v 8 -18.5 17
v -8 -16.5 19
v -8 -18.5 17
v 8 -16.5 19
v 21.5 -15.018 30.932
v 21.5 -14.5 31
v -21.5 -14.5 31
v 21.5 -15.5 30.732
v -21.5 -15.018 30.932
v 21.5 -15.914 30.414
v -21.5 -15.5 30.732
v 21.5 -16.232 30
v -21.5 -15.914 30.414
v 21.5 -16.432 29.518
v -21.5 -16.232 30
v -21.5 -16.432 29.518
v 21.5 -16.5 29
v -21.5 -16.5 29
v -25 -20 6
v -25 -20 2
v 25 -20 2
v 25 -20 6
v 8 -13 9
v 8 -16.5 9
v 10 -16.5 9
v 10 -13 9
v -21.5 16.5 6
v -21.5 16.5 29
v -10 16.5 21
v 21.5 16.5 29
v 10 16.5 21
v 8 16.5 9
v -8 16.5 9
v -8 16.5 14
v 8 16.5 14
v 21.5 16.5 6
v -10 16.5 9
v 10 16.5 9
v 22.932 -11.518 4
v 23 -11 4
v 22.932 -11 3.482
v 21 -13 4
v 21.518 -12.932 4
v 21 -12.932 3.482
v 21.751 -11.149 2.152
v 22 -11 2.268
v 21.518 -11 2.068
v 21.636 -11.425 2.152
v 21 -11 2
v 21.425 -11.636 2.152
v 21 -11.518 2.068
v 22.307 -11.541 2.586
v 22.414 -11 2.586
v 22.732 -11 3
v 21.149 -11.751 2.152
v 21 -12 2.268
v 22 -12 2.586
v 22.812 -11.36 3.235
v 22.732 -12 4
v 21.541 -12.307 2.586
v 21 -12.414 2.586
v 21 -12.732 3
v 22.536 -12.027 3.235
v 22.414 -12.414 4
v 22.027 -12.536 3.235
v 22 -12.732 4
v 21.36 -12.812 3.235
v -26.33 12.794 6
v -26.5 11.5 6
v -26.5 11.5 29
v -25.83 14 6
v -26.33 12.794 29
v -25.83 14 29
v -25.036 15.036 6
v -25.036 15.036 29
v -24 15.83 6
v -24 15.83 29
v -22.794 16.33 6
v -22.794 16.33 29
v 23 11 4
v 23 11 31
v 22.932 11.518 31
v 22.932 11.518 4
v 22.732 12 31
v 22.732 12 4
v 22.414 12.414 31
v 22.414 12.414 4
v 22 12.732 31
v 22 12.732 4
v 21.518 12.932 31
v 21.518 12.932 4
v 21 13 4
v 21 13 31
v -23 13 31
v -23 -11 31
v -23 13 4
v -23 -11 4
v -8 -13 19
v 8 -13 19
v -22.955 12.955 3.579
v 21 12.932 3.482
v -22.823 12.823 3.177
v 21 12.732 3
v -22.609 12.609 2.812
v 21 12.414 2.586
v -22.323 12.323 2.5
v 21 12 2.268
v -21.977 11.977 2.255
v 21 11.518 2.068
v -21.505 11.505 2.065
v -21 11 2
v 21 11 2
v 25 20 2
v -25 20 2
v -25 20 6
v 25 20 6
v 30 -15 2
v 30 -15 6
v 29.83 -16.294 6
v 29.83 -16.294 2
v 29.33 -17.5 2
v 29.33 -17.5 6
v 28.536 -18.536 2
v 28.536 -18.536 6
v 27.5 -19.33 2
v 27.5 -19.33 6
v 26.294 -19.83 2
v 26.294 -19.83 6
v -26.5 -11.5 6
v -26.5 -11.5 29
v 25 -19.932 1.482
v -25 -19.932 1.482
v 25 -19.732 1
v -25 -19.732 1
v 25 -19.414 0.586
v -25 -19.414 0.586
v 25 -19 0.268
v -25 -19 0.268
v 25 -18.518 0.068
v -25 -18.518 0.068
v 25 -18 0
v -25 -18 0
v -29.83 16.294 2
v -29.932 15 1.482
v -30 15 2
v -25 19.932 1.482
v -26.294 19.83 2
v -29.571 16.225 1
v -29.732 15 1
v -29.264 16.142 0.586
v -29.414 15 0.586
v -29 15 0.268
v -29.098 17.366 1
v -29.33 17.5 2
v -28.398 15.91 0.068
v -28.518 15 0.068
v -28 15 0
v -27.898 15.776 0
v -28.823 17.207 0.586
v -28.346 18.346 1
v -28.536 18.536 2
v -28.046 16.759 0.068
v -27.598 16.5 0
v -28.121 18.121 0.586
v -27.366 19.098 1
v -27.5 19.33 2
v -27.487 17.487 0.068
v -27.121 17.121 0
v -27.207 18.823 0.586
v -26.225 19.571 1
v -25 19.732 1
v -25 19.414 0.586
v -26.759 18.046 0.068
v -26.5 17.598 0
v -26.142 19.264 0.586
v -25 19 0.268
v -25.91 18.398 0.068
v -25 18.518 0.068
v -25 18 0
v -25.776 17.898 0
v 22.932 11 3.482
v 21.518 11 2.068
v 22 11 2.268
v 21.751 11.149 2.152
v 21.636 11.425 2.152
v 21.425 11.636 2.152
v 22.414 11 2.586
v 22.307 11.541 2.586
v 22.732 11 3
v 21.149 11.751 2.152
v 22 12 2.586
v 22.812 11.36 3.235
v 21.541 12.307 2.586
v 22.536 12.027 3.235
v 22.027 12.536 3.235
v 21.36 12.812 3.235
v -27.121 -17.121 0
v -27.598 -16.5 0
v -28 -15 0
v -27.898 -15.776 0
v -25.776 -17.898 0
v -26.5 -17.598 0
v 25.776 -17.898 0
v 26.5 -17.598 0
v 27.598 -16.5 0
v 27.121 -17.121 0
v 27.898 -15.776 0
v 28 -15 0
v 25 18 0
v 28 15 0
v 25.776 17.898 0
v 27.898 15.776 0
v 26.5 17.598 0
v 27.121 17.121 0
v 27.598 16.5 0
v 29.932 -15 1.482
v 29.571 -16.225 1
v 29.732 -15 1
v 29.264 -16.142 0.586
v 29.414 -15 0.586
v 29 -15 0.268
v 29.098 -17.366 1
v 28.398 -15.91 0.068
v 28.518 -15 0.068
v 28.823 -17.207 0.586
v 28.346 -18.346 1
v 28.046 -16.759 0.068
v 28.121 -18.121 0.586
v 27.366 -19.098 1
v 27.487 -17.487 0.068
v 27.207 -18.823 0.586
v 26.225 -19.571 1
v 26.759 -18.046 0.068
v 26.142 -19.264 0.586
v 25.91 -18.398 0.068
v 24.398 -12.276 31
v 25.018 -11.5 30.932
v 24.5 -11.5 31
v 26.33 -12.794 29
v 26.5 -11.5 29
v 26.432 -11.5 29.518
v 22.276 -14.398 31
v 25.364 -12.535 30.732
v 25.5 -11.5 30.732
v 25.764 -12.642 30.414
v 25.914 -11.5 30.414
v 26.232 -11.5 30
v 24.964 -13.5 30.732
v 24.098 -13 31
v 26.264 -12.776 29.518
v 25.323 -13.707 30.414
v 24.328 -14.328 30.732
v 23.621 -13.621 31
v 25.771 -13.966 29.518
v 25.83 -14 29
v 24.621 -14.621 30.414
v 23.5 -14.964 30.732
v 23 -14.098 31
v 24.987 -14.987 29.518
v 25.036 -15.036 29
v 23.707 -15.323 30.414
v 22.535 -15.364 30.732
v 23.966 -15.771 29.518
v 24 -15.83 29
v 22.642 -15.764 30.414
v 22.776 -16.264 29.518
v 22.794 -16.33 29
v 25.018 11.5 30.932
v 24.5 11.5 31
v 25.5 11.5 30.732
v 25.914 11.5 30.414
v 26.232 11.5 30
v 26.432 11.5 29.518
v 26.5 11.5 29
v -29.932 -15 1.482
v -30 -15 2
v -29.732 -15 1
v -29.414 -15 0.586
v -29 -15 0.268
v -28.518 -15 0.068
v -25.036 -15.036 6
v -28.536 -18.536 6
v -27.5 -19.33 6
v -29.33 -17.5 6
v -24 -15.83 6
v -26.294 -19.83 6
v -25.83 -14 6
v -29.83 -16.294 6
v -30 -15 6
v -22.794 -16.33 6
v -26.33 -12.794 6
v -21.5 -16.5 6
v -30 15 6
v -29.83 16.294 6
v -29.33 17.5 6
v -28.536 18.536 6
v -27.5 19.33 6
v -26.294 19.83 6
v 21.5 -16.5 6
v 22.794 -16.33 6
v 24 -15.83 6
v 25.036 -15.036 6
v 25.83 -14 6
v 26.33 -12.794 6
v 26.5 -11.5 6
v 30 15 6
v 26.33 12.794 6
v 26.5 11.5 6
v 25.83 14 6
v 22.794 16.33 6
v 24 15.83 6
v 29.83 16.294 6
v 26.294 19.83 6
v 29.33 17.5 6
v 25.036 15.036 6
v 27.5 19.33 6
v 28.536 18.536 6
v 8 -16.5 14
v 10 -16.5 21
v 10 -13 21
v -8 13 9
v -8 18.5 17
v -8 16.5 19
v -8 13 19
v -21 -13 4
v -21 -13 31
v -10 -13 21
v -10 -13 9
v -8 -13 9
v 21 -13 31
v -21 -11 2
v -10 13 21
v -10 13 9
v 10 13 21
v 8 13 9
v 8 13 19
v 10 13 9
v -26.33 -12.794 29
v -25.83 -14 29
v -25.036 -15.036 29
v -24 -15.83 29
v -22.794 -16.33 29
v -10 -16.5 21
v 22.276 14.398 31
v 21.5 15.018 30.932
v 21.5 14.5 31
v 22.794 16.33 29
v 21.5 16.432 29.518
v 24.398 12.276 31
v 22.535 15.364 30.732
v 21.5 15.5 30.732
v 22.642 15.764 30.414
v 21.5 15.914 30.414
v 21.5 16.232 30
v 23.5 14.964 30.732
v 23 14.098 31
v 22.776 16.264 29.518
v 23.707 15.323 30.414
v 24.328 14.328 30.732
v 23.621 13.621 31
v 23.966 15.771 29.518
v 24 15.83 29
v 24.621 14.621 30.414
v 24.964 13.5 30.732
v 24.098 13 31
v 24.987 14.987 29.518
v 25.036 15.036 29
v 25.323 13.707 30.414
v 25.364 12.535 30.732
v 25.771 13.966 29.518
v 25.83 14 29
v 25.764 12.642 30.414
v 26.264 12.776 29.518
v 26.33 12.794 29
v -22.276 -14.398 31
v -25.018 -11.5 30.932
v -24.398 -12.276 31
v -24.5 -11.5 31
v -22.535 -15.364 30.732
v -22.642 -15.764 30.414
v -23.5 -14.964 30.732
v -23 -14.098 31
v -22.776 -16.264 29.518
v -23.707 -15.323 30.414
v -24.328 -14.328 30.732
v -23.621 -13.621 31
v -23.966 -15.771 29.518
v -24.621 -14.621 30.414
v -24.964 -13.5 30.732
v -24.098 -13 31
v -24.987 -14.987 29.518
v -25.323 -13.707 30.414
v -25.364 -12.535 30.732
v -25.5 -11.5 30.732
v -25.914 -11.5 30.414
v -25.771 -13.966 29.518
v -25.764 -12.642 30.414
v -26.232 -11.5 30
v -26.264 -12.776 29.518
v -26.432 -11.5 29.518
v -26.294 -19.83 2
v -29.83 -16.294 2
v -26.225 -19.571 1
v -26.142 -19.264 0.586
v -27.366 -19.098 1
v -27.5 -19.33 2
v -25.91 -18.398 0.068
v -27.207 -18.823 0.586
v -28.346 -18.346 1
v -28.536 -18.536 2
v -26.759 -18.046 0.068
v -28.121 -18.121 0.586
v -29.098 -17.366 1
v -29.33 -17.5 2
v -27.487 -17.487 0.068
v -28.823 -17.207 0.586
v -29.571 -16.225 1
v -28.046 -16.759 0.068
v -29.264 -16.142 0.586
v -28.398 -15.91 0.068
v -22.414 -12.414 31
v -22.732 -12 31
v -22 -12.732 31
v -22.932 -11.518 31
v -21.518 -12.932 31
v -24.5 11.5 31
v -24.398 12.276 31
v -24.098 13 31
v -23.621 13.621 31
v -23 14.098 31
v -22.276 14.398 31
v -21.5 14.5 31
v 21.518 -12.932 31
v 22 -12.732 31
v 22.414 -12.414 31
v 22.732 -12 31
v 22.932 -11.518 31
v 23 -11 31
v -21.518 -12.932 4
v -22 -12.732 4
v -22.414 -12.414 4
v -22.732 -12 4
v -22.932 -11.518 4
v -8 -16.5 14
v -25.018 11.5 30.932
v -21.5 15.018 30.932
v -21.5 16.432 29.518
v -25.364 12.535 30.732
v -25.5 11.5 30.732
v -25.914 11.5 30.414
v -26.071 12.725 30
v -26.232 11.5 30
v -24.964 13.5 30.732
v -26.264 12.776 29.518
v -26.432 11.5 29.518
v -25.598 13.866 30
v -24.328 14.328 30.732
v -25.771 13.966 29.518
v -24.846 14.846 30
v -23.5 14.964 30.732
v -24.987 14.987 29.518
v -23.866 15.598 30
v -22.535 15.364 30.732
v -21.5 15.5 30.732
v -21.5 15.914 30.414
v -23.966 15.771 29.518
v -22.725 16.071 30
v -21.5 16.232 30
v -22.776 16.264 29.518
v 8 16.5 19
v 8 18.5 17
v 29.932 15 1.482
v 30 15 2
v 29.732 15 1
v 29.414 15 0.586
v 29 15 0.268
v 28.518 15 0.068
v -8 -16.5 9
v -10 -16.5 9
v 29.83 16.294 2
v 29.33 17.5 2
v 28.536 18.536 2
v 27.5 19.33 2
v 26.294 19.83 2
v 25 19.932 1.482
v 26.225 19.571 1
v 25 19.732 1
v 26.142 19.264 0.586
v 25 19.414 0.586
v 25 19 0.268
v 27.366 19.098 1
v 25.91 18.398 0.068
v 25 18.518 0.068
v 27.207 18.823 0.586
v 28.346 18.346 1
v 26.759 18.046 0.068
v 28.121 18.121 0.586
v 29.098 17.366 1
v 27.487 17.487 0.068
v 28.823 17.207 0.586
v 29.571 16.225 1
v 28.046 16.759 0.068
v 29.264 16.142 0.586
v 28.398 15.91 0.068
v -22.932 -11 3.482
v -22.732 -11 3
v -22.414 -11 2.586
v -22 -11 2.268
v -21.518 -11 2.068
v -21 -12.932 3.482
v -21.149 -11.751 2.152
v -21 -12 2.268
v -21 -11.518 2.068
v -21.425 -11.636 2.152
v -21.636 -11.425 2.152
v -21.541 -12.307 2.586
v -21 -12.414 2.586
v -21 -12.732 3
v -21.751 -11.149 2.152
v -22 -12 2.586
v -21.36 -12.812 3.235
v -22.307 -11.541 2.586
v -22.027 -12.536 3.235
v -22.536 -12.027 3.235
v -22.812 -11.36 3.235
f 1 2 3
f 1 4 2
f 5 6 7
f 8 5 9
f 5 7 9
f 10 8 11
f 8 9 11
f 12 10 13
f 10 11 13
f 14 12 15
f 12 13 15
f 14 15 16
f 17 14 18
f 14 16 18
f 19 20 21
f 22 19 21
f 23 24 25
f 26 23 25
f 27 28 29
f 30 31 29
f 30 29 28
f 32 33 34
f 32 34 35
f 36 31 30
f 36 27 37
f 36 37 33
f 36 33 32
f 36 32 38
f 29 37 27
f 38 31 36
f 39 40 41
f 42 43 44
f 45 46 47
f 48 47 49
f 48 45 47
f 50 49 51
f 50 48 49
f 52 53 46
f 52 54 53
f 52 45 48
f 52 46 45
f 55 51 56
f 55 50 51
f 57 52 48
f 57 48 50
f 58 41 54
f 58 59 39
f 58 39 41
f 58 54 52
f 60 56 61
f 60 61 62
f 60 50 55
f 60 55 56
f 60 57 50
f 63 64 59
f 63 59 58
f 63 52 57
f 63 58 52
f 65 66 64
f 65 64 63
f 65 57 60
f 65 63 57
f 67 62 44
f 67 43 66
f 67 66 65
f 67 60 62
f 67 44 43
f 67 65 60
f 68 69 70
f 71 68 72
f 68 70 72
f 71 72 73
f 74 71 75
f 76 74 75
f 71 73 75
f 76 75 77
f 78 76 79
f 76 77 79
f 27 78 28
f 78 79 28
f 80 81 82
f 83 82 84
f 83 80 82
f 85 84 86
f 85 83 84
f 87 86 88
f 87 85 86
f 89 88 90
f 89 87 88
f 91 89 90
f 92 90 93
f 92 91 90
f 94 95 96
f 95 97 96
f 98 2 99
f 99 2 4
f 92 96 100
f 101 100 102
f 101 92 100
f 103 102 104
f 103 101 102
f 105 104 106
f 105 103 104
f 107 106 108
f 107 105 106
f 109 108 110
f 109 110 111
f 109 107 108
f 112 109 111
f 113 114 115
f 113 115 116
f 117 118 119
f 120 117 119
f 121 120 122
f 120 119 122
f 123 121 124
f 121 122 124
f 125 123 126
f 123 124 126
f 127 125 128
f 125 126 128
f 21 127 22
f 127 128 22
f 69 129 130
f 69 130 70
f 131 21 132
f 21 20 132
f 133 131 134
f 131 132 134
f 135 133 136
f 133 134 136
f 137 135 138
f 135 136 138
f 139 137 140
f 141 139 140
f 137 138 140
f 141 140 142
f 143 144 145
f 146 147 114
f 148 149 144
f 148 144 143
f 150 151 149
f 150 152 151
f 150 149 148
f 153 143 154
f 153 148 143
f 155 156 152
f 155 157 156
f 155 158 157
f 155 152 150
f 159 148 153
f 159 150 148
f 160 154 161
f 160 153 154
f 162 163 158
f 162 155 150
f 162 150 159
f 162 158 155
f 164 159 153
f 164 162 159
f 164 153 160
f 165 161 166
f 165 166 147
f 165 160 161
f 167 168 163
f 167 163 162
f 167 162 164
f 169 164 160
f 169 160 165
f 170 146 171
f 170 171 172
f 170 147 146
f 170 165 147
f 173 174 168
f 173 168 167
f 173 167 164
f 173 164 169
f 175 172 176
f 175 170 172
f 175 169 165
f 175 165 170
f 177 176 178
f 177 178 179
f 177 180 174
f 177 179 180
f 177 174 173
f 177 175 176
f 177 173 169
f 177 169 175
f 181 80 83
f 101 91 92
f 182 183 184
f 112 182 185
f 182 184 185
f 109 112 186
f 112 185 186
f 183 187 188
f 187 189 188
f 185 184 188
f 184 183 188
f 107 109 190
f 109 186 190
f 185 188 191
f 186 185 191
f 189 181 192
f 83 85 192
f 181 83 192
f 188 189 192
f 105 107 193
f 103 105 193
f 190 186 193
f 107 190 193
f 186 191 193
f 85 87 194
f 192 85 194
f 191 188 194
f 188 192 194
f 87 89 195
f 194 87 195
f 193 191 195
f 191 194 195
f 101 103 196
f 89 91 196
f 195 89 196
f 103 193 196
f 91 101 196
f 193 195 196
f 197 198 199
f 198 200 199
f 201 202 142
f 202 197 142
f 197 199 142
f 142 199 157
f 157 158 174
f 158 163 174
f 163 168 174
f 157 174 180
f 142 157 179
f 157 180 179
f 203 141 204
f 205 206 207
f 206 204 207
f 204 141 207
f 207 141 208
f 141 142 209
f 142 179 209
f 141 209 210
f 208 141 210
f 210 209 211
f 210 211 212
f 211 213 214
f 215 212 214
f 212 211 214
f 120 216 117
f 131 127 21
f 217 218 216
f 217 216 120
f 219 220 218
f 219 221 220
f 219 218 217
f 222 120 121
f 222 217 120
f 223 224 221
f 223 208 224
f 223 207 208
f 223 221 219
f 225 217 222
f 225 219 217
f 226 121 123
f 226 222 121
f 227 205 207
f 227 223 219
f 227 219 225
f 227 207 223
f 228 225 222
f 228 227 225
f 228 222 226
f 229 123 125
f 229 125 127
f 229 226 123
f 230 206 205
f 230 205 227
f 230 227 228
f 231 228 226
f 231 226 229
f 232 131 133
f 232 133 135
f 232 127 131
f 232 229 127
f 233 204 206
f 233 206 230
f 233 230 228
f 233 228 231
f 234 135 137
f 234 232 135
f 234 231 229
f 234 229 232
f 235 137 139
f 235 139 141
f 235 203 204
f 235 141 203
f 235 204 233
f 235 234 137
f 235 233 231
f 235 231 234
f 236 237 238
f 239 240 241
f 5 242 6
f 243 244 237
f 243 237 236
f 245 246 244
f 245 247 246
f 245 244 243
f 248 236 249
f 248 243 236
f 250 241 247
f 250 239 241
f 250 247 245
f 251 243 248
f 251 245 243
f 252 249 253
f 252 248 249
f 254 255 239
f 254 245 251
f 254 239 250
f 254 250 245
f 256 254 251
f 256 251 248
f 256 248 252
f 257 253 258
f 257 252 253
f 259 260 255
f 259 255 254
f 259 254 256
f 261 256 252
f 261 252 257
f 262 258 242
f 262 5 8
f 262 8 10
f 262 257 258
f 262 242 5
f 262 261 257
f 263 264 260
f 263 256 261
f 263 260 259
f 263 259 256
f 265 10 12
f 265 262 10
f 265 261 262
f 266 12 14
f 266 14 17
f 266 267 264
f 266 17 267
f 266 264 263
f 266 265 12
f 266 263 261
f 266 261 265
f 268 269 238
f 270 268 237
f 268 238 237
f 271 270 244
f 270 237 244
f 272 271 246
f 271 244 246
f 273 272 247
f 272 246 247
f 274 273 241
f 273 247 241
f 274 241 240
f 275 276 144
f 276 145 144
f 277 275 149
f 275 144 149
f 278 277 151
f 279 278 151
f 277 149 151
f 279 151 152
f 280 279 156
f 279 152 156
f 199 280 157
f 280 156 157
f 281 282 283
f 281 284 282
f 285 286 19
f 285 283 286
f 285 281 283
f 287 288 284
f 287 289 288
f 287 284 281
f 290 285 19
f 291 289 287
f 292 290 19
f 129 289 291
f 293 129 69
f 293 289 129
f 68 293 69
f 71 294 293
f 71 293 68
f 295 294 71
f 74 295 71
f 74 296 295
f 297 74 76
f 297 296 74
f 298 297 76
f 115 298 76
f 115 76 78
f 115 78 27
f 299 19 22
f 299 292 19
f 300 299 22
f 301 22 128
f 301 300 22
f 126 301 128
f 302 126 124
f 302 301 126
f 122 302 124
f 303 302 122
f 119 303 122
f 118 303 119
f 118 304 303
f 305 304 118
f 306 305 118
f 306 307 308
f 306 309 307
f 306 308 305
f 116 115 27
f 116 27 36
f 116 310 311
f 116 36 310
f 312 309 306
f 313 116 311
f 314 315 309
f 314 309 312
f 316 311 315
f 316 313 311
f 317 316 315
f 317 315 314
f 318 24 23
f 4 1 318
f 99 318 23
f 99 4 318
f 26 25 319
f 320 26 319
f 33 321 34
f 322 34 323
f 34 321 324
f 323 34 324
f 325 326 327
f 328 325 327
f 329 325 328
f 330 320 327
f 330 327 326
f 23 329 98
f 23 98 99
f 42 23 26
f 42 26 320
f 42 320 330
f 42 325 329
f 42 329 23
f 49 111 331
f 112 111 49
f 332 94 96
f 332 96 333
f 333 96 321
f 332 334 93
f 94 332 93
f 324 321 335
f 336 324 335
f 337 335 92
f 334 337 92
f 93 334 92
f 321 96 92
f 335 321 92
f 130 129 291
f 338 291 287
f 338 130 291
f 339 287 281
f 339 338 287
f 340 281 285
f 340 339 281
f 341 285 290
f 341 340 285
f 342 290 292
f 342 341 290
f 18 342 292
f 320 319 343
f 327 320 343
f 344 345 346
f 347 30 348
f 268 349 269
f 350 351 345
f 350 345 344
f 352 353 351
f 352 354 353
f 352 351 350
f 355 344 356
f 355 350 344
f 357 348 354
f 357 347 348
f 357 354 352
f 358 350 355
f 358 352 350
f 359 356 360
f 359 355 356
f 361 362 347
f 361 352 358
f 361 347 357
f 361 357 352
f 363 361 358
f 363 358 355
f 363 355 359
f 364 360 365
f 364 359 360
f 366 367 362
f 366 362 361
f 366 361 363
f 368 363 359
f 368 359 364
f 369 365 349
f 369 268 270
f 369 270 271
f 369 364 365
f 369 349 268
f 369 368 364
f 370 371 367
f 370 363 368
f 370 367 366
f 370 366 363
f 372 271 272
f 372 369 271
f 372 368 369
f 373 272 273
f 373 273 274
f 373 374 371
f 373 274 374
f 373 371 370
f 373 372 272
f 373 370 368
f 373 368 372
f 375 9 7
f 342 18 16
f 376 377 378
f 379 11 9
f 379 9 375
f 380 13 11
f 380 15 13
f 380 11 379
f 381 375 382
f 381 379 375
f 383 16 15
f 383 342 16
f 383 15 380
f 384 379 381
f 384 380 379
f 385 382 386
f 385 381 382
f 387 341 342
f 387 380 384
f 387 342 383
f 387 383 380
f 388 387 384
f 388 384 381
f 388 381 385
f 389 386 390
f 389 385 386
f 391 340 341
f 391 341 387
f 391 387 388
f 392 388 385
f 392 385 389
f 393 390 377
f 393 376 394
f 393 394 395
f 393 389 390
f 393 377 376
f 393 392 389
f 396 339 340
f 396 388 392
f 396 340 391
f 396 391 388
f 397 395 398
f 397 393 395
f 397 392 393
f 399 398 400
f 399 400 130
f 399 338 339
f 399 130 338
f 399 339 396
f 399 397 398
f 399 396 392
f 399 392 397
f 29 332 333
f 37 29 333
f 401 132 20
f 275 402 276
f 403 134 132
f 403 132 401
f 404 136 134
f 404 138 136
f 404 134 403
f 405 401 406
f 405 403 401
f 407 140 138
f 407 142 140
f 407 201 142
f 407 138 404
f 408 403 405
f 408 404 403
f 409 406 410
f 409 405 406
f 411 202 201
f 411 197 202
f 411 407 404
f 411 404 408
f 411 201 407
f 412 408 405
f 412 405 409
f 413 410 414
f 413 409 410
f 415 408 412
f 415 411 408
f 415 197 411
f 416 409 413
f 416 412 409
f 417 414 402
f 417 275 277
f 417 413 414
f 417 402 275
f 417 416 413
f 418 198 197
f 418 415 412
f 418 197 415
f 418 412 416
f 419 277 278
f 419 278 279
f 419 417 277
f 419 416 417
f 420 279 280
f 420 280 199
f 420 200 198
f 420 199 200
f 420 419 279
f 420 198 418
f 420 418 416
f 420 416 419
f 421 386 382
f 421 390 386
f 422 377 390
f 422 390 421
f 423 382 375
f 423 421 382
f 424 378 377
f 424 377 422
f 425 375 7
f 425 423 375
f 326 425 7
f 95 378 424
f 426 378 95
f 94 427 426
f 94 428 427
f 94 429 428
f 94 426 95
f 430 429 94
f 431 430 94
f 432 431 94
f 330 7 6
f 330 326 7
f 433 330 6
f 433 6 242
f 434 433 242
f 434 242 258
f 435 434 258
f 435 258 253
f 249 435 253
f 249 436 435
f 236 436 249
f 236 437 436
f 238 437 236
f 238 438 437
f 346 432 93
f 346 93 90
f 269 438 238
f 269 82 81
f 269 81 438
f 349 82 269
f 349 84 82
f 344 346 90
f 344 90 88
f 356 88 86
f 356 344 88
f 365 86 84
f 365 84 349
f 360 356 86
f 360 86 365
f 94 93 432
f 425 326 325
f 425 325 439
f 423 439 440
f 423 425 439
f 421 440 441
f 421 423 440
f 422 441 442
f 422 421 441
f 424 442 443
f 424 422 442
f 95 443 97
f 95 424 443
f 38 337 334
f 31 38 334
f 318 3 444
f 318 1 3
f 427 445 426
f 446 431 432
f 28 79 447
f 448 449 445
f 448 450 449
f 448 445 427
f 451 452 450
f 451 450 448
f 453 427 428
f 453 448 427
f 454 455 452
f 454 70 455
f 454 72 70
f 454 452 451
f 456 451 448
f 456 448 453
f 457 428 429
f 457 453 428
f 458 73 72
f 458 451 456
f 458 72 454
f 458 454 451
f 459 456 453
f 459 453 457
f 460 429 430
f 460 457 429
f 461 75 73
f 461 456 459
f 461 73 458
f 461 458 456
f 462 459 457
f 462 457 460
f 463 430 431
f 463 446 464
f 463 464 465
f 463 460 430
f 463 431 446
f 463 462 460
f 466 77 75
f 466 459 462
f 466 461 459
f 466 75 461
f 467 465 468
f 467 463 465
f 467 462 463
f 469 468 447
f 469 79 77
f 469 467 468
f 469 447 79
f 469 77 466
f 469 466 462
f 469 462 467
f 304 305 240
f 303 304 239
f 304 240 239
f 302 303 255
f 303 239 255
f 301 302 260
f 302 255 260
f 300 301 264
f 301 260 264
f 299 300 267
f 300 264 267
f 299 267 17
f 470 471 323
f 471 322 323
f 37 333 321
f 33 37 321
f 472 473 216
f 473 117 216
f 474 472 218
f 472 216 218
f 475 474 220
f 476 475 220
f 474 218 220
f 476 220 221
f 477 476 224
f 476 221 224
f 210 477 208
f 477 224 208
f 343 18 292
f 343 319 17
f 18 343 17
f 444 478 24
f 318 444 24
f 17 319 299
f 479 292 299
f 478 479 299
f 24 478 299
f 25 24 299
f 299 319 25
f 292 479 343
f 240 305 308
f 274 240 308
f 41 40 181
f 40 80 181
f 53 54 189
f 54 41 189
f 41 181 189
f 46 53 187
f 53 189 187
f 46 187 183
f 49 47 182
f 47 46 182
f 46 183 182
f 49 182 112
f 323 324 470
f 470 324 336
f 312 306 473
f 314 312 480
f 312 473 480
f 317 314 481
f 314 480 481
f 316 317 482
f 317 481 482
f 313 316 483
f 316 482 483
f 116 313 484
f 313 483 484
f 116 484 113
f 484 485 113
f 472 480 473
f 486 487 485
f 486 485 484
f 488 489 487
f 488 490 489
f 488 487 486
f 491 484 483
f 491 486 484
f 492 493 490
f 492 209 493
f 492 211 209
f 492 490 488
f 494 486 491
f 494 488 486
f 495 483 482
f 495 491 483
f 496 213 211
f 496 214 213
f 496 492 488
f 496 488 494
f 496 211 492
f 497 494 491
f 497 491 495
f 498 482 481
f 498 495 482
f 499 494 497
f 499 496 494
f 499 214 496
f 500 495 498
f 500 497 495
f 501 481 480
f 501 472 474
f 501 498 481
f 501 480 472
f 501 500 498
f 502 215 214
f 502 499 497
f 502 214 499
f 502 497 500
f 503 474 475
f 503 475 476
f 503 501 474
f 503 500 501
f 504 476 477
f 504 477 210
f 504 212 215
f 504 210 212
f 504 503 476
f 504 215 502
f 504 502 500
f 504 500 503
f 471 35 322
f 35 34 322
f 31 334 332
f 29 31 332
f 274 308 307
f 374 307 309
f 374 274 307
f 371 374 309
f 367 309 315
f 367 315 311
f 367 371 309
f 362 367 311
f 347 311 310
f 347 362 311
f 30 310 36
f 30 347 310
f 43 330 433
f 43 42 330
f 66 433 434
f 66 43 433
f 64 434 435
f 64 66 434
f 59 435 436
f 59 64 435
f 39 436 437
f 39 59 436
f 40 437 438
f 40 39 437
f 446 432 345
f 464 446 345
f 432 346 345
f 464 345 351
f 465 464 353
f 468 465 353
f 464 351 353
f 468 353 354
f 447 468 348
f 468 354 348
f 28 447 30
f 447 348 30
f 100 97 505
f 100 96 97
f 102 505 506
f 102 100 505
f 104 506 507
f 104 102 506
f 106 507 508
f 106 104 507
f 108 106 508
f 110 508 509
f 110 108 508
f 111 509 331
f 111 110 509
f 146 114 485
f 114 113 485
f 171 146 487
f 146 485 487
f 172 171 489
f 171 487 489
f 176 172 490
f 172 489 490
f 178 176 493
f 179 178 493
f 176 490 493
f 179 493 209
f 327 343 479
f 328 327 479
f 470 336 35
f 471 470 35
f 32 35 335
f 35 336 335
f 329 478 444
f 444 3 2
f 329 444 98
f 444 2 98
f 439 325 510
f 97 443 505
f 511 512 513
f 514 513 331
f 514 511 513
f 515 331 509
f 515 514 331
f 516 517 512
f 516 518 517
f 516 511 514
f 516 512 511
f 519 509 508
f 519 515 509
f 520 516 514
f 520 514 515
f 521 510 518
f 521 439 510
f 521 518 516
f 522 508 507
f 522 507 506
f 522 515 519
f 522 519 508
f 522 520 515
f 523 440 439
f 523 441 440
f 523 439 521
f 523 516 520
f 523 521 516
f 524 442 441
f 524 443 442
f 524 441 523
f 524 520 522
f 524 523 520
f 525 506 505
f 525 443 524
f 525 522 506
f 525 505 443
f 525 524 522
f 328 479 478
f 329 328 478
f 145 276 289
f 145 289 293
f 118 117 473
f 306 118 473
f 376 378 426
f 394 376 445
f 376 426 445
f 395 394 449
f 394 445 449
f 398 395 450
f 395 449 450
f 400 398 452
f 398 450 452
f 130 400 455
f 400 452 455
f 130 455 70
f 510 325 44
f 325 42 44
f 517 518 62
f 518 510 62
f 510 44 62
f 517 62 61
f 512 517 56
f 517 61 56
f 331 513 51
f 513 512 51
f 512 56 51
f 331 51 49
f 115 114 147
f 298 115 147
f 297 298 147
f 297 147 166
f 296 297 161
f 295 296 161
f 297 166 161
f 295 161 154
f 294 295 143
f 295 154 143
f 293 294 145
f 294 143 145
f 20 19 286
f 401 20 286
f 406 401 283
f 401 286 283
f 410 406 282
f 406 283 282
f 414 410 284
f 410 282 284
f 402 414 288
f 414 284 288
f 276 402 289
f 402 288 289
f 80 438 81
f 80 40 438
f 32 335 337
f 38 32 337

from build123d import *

# Parameters (mm, degrees)
F0_W           = 60
F0_H           = 40
F1_DEPTH       = 2
F2_W           = 60
F2_H           = 40
F2_W_2         = 46
F2_H_2         = 26
F3_DEPTH       = 4
F4_W           = 53
F4_H           = 33
F4_W_2         = 46
F4_H_2         = 26
F5_DEPTH       = 25
F6_R           = 5
F7_R           = 2
F9_DEPTH       = 36.501
F11_DEPTH      = 8
F11_DEPTH_BACK = 8


with BuildPart() as f1:
    # F0 (on Top) → F1 (new body)
    with BuildSketch(Plane.XY):
        Rectangle(F0_W, F0_H)
    extrude(amount=F1_DEPTH)

    # F2 (on face) → F3 (join)
    with BuildSketch(Plane.XY.offset(2)):
        Rectangle(F2_W, F2_H)
        Rectangle(F2_W_2, F2_H_2, mode=Mode.SUBTRACT)
    extrude(amount=F3_DEPTH)

    # F4 (on face) → F5 (join)
    with BuildSketch(Plane.XY.offset(6)):
        Rectangle(F4_W, F4_H)
        Rectangle(F4_W_2, F4_H_2, mode=Mode.SUBTRACT)
    extrude(amount=F5_DEPTH)

    # F6
    f6_edges = [f1.edges().sort_by_distance(p)[0] for p in [
        (-26.5, -16.5, 18.5),
        (26.5, -16.5, 18.5),
        (-26.5, 16.5, 18.5),
        (-30, -20, 3),
        (30, -20, 3),
        (-30, 20, 3),
        (30, 20, 3),
        (26.5, 16.5, 18.5),
    ]]
    fillet(f6_edges, radius=F6_R)

    # F7
    f7_edges = [f1.edges().sort_by_distance(p)[0] for p in [
        (0, 16.5, 31),
        (0, 20, 0),
        (23, -13, 16.5),
        (-23, -13, 16.5),
        (23, 13, 16.5),
        (23, 0, 2),
        (0, 13, 2),
        (0, -13, 2),
        (-23, 0, 2),
    ]]
    fillet(f7_edges, radius=F7_R)

    # F8 (on face) → F9 (cut, through all)
    with BuildSketch(Plane.XZ.offset(16.5)):
        Polygon((10, 21), (-10, 21), (-10, 9), (-8, 9), (-8, 19), (8, 19), (8, 9), (10, 9), align=None)
    extrude(amount=-F9_DEPTH, mode=Mode.SUBTRACT)

    # F10 (on Right) → F11 (join, two sides)
    with BuildSketch(Plane.YZ) as f11_sk:
        Polygon((-18.5, 17), (-16.5, 14), (-16.5, 19), align=None)
        Polygon((16.5, 19), (16.5, 14), (18.5, 17), align=None)
    extrude(amount=F11_DEPTH)
    extrude(f11_sk.sketch, amount=-F11_DEPTH_BACK)


solid = f1.part
